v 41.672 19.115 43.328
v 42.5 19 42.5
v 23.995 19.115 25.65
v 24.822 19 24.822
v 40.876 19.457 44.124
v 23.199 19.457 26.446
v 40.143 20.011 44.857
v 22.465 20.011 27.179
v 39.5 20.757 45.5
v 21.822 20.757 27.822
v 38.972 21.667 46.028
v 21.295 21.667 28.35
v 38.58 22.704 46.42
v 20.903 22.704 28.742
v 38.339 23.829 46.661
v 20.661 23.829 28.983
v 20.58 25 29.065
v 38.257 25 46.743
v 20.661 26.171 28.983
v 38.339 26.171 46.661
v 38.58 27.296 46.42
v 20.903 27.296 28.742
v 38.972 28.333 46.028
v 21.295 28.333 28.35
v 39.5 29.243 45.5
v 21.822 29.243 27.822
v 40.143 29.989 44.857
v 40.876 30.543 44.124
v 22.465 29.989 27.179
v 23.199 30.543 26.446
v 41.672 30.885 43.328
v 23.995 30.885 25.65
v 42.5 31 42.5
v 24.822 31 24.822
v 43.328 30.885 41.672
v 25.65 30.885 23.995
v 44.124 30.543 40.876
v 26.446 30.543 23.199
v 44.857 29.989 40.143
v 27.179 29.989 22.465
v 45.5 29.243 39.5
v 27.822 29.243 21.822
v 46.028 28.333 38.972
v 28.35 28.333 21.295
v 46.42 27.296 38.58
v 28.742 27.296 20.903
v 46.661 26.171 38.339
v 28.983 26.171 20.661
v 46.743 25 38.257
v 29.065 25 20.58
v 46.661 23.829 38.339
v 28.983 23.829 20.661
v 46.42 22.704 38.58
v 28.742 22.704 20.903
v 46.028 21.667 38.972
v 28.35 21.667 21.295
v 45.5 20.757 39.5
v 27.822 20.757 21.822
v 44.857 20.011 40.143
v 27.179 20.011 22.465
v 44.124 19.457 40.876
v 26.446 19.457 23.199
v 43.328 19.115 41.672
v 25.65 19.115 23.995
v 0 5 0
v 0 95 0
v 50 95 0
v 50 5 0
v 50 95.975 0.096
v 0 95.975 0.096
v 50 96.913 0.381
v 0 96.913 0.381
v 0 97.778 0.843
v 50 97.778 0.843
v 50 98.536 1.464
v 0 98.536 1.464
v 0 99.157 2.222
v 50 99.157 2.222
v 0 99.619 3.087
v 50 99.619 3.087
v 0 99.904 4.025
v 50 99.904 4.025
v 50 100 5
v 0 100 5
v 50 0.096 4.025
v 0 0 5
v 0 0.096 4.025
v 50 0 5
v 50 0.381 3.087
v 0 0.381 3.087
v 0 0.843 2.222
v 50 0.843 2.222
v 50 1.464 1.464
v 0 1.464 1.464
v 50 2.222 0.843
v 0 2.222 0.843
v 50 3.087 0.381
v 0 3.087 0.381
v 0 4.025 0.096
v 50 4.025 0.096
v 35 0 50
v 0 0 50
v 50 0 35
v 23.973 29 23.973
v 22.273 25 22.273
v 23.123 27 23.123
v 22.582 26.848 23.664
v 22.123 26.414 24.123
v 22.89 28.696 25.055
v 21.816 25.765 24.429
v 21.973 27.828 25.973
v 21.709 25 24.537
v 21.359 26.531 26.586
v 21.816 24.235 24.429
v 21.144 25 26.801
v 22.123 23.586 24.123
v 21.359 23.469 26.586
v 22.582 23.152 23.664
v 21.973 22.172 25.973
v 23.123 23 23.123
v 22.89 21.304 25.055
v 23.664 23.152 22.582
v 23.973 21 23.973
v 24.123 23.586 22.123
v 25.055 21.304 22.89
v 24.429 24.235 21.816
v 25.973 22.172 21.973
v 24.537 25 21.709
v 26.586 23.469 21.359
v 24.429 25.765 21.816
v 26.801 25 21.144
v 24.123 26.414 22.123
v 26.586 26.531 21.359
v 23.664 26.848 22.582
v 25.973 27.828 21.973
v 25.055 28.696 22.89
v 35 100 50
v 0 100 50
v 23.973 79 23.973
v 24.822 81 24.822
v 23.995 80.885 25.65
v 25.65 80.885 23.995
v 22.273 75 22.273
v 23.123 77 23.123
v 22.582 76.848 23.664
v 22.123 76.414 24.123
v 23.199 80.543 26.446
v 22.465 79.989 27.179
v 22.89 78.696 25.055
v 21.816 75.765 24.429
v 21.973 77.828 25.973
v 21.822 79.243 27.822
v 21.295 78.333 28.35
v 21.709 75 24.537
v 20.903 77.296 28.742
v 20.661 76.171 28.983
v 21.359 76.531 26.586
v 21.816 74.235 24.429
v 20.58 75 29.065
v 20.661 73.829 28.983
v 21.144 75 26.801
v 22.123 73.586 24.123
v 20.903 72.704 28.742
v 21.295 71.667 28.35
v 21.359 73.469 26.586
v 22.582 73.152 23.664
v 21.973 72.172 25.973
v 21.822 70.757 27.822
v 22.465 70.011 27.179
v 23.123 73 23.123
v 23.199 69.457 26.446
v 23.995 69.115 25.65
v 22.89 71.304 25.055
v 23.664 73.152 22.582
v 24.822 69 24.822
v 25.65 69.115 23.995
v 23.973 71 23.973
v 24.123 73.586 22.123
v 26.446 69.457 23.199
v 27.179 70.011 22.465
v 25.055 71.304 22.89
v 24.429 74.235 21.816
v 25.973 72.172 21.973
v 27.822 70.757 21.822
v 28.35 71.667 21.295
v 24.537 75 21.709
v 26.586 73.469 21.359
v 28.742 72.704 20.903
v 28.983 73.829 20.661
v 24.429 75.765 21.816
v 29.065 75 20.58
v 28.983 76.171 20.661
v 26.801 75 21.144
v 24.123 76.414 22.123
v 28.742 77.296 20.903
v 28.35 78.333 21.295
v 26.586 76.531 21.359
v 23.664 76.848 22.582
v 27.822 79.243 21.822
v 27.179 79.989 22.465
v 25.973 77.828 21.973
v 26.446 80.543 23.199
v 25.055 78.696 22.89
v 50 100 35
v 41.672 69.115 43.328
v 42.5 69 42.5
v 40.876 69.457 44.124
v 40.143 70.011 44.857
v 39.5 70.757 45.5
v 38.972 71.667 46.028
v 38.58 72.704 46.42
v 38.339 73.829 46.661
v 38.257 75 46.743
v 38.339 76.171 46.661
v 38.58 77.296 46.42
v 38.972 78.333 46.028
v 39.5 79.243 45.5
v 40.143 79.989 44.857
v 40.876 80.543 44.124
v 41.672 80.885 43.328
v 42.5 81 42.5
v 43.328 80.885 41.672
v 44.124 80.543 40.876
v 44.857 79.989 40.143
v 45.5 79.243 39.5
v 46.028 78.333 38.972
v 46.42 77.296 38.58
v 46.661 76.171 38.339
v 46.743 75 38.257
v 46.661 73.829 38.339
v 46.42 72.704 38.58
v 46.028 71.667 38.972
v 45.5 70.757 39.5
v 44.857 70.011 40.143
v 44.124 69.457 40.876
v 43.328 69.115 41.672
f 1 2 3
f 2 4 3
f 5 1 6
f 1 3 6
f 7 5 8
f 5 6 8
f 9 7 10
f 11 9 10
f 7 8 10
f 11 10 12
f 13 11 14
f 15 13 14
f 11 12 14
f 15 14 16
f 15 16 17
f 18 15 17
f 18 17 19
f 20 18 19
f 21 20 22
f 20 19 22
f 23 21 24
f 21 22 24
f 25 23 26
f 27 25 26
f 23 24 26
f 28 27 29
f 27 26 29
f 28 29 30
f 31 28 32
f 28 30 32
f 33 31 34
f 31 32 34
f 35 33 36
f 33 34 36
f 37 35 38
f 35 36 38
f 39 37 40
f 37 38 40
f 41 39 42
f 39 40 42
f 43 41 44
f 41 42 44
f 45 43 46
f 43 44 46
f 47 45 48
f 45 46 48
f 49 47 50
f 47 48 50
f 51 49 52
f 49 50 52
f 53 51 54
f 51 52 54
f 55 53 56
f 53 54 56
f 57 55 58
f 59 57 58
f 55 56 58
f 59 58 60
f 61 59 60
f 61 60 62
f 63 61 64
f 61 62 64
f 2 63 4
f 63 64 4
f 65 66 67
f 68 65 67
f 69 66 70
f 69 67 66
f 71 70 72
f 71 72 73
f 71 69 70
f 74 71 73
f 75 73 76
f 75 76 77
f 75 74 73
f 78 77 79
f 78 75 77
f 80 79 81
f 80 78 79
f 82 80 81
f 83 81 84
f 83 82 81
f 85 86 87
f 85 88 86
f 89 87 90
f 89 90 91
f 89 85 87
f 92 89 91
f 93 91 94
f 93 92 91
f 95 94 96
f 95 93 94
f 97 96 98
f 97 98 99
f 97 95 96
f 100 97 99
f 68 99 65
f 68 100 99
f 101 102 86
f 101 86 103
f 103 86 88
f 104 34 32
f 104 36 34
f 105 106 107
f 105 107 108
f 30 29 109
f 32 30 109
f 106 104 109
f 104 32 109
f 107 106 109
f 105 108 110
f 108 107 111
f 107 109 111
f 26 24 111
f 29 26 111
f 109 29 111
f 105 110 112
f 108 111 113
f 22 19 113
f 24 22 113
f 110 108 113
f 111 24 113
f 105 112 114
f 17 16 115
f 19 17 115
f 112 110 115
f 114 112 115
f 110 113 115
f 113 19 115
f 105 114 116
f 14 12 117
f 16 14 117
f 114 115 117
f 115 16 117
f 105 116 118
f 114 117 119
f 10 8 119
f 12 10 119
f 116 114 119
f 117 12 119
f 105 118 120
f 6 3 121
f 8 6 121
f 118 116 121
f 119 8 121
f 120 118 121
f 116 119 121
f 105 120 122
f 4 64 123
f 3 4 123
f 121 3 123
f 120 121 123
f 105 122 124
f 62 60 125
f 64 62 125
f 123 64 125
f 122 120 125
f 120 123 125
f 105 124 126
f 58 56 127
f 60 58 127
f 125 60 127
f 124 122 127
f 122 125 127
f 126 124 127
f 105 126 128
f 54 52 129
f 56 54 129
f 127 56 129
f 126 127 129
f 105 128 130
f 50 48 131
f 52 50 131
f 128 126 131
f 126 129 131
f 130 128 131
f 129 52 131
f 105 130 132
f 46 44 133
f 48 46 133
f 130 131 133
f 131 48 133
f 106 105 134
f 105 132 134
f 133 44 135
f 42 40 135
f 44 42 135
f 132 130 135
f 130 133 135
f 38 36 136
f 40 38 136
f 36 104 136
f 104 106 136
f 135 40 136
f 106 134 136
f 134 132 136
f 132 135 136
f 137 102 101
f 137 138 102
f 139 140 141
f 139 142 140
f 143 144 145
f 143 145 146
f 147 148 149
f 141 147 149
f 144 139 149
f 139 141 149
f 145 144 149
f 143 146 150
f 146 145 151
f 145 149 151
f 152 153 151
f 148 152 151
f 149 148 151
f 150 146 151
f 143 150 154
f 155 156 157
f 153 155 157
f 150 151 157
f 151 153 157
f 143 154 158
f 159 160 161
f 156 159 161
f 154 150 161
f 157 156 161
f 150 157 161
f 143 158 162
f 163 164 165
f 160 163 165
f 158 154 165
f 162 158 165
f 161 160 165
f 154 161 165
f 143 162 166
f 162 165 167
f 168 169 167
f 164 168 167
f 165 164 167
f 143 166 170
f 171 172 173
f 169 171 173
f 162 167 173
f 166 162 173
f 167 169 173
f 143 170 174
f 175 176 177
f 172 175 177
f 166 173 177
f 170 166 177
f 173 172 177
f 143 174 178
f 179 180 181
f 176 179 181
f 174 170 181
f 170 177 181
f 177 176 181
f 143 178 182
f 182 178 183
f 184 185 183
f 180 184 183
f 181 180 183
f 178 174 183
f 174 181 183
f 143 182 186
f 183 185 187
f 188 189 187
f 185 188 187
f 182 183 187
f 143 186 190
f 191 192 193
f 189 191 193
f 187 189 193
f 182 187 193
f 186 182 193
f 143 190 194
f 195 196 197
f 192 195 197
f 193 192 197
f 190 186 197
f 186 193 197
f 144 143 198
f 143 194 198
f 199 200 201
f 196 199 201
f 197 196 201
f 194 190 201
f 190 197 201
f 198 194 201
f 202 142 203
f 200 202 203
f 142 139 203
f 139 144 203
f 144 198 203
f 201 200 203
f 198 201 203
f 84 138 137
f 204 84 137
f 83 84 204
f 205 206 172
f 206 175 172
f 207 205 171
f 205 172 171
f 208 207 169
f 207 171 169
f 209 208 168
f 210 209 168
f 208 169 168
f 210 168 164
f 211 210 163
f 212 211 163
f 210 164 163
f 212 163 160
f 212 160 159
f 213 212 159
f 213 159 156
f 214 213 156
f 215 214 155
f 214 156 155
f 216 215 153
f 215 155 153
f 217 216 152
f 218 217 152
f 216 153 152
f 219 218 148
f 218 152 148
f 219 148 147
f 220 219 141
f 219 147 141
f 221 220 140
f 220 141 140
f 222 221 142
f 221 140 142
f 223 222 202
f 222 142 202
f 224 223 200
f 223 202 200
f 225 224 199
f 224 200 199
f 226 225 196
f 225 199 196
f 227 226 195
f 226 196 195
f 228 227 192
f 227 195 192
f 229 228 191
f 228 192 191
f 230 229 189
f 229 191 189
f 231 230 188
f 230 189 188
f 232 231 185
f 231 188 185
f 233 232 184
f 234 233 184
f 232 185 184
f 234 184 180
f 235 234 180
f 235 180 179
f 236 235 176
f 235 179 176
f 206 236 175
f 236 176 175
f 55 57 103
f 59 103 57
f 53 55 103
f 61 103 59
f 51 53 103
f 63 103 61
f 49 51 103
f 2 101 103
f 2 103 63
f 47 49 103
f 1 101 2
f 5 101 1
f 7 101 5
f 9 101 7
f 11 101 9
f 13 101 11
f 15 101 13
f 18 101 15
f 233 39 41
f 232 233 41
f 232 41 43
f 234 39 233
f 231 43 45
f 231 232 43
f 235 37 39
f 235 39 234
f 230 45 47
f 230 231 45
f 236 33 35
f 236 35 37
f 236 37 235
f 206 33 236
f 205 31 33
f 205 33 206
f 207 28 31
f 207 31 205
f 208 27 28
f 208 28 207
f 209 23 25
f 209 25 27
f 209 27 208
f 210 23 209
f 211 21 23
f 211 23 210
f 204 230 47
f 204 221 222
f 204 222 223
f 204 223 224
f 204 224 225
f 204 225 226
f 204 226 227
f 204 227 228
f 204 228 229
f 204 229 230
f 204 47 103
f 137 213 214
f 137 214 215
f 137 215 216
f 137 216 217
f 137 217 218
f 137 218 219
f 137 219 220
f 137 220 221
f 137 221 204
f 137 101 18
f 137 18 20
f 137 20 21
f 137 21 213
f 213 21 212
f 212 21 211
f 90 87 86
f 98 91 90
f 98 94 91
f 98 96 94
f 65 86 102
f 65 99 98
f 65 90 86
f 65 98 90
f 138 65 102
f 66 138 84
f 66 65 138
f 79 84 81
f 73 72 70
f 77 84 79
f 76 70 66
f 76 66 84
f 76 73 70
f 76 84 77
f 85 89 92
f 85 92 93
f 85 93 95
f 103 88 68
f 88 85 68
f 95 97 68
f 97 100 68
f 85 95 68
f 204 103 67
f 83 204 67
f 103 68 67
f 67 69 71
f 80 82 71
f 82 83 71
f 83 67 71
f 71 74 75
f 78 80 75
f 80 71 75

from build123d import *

# Parameters (mm, degrees)
F0_W     = 50
F0_H     = 100
F1_DEPTH = 50
F2_SIZE  = 15
F4_D     = 12
F4_DEPTH = 25
F4_TIP   = 3.6051637142
F5_R     = 5


with BuildPart() as f1:
    # F0 (on Top) → F1 (new body)
    with BuildSketch(Plane.XY):
        with Locations((25, 50)):
            Rectangle(F0_W, F0_H)
    extrude(amount=F1_DEPTH)

    # F2
    f2_edges = [f1.edges().sort_by_distance(p)[0] for p in [
        (50, 50, 50),
    ]]
    chamfer(f2_edges, length=F2_SIZE)

    # F4
    with Locations(Plane(origin=(42.5, 0, 42.5), x_dir=(0, 1, 0), z_dir=(0.7071067812, 0, 0.7071067812))):
        with Locations((25, 0), (75, 0)):
            Hole(F4_D / 2, depth=F4_DEPTH)
            with Locations((0, 0, -(F4_DEPTH + F4_TIP / 2))):  # 118° drill point
                Cone(0, F4_D / 2, F4_TIP, mode=Mode.SUBTRACT)

    # F5
    f5_edges = [f1.edges().sort_by_distance(p)[0] for p in [
        (25, 100, 0),
        (25, 0, 0),
    ]]
    fillet(f5_edges, radius=F5_R)


solid = f1.part
